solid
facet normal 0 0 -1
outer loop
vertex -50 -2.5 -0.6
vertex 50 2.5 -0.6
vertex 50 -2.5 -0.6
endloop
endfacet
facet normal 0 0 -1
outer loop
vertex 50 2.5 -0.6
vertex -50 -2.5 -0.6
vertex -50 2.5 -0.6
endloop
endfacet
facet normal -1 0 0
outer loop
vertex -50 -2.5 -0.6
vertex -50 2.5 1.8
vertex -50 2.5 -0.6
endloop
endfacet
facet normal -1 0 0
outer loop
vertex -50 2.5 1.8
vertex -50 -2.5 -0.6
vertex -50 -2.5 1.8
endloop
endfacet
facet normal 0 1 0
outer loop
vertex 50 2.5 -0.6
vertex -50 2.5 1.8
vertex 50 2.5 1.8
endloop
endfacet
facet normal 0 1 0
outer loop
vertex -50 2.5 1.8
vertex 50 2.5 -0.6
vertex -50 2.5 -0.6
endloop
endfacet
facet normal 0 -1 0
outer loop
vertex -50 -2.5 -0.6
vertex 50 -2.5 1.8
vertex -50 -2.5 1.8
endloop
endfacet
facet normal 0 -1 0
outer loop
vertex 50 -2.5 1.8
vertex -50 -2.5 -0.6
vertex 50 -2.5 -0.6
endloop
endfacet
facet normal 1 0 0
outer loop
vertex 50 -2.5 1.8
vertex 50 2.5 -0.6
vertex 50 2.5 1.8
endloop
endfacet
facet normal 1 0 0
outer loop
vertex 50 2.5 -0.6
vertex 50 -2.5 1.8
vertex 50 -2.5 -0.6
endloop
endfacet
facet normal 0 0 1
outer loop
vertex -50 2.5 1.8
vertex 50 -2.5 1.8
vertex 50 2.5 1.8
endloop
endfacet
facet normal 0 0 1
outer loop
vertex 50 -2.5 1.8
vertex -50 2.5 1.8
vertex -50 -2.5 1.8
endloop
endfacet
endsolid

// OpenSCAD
module linear_guide_rail() {
    difference() {
        // Main body of the rail
        translate([-50, -2.5, -1.8])
            cube([100, 5, 3.6]);
        
        // Cutouts for the rail
        translate([-50, -2.5, -1.8])
            for (i = [0:10:90]) {
                translate([i, 0, 0])
                    cube([10, 5, 1.2]);
            }
    }
}

linear_guide_rail();
